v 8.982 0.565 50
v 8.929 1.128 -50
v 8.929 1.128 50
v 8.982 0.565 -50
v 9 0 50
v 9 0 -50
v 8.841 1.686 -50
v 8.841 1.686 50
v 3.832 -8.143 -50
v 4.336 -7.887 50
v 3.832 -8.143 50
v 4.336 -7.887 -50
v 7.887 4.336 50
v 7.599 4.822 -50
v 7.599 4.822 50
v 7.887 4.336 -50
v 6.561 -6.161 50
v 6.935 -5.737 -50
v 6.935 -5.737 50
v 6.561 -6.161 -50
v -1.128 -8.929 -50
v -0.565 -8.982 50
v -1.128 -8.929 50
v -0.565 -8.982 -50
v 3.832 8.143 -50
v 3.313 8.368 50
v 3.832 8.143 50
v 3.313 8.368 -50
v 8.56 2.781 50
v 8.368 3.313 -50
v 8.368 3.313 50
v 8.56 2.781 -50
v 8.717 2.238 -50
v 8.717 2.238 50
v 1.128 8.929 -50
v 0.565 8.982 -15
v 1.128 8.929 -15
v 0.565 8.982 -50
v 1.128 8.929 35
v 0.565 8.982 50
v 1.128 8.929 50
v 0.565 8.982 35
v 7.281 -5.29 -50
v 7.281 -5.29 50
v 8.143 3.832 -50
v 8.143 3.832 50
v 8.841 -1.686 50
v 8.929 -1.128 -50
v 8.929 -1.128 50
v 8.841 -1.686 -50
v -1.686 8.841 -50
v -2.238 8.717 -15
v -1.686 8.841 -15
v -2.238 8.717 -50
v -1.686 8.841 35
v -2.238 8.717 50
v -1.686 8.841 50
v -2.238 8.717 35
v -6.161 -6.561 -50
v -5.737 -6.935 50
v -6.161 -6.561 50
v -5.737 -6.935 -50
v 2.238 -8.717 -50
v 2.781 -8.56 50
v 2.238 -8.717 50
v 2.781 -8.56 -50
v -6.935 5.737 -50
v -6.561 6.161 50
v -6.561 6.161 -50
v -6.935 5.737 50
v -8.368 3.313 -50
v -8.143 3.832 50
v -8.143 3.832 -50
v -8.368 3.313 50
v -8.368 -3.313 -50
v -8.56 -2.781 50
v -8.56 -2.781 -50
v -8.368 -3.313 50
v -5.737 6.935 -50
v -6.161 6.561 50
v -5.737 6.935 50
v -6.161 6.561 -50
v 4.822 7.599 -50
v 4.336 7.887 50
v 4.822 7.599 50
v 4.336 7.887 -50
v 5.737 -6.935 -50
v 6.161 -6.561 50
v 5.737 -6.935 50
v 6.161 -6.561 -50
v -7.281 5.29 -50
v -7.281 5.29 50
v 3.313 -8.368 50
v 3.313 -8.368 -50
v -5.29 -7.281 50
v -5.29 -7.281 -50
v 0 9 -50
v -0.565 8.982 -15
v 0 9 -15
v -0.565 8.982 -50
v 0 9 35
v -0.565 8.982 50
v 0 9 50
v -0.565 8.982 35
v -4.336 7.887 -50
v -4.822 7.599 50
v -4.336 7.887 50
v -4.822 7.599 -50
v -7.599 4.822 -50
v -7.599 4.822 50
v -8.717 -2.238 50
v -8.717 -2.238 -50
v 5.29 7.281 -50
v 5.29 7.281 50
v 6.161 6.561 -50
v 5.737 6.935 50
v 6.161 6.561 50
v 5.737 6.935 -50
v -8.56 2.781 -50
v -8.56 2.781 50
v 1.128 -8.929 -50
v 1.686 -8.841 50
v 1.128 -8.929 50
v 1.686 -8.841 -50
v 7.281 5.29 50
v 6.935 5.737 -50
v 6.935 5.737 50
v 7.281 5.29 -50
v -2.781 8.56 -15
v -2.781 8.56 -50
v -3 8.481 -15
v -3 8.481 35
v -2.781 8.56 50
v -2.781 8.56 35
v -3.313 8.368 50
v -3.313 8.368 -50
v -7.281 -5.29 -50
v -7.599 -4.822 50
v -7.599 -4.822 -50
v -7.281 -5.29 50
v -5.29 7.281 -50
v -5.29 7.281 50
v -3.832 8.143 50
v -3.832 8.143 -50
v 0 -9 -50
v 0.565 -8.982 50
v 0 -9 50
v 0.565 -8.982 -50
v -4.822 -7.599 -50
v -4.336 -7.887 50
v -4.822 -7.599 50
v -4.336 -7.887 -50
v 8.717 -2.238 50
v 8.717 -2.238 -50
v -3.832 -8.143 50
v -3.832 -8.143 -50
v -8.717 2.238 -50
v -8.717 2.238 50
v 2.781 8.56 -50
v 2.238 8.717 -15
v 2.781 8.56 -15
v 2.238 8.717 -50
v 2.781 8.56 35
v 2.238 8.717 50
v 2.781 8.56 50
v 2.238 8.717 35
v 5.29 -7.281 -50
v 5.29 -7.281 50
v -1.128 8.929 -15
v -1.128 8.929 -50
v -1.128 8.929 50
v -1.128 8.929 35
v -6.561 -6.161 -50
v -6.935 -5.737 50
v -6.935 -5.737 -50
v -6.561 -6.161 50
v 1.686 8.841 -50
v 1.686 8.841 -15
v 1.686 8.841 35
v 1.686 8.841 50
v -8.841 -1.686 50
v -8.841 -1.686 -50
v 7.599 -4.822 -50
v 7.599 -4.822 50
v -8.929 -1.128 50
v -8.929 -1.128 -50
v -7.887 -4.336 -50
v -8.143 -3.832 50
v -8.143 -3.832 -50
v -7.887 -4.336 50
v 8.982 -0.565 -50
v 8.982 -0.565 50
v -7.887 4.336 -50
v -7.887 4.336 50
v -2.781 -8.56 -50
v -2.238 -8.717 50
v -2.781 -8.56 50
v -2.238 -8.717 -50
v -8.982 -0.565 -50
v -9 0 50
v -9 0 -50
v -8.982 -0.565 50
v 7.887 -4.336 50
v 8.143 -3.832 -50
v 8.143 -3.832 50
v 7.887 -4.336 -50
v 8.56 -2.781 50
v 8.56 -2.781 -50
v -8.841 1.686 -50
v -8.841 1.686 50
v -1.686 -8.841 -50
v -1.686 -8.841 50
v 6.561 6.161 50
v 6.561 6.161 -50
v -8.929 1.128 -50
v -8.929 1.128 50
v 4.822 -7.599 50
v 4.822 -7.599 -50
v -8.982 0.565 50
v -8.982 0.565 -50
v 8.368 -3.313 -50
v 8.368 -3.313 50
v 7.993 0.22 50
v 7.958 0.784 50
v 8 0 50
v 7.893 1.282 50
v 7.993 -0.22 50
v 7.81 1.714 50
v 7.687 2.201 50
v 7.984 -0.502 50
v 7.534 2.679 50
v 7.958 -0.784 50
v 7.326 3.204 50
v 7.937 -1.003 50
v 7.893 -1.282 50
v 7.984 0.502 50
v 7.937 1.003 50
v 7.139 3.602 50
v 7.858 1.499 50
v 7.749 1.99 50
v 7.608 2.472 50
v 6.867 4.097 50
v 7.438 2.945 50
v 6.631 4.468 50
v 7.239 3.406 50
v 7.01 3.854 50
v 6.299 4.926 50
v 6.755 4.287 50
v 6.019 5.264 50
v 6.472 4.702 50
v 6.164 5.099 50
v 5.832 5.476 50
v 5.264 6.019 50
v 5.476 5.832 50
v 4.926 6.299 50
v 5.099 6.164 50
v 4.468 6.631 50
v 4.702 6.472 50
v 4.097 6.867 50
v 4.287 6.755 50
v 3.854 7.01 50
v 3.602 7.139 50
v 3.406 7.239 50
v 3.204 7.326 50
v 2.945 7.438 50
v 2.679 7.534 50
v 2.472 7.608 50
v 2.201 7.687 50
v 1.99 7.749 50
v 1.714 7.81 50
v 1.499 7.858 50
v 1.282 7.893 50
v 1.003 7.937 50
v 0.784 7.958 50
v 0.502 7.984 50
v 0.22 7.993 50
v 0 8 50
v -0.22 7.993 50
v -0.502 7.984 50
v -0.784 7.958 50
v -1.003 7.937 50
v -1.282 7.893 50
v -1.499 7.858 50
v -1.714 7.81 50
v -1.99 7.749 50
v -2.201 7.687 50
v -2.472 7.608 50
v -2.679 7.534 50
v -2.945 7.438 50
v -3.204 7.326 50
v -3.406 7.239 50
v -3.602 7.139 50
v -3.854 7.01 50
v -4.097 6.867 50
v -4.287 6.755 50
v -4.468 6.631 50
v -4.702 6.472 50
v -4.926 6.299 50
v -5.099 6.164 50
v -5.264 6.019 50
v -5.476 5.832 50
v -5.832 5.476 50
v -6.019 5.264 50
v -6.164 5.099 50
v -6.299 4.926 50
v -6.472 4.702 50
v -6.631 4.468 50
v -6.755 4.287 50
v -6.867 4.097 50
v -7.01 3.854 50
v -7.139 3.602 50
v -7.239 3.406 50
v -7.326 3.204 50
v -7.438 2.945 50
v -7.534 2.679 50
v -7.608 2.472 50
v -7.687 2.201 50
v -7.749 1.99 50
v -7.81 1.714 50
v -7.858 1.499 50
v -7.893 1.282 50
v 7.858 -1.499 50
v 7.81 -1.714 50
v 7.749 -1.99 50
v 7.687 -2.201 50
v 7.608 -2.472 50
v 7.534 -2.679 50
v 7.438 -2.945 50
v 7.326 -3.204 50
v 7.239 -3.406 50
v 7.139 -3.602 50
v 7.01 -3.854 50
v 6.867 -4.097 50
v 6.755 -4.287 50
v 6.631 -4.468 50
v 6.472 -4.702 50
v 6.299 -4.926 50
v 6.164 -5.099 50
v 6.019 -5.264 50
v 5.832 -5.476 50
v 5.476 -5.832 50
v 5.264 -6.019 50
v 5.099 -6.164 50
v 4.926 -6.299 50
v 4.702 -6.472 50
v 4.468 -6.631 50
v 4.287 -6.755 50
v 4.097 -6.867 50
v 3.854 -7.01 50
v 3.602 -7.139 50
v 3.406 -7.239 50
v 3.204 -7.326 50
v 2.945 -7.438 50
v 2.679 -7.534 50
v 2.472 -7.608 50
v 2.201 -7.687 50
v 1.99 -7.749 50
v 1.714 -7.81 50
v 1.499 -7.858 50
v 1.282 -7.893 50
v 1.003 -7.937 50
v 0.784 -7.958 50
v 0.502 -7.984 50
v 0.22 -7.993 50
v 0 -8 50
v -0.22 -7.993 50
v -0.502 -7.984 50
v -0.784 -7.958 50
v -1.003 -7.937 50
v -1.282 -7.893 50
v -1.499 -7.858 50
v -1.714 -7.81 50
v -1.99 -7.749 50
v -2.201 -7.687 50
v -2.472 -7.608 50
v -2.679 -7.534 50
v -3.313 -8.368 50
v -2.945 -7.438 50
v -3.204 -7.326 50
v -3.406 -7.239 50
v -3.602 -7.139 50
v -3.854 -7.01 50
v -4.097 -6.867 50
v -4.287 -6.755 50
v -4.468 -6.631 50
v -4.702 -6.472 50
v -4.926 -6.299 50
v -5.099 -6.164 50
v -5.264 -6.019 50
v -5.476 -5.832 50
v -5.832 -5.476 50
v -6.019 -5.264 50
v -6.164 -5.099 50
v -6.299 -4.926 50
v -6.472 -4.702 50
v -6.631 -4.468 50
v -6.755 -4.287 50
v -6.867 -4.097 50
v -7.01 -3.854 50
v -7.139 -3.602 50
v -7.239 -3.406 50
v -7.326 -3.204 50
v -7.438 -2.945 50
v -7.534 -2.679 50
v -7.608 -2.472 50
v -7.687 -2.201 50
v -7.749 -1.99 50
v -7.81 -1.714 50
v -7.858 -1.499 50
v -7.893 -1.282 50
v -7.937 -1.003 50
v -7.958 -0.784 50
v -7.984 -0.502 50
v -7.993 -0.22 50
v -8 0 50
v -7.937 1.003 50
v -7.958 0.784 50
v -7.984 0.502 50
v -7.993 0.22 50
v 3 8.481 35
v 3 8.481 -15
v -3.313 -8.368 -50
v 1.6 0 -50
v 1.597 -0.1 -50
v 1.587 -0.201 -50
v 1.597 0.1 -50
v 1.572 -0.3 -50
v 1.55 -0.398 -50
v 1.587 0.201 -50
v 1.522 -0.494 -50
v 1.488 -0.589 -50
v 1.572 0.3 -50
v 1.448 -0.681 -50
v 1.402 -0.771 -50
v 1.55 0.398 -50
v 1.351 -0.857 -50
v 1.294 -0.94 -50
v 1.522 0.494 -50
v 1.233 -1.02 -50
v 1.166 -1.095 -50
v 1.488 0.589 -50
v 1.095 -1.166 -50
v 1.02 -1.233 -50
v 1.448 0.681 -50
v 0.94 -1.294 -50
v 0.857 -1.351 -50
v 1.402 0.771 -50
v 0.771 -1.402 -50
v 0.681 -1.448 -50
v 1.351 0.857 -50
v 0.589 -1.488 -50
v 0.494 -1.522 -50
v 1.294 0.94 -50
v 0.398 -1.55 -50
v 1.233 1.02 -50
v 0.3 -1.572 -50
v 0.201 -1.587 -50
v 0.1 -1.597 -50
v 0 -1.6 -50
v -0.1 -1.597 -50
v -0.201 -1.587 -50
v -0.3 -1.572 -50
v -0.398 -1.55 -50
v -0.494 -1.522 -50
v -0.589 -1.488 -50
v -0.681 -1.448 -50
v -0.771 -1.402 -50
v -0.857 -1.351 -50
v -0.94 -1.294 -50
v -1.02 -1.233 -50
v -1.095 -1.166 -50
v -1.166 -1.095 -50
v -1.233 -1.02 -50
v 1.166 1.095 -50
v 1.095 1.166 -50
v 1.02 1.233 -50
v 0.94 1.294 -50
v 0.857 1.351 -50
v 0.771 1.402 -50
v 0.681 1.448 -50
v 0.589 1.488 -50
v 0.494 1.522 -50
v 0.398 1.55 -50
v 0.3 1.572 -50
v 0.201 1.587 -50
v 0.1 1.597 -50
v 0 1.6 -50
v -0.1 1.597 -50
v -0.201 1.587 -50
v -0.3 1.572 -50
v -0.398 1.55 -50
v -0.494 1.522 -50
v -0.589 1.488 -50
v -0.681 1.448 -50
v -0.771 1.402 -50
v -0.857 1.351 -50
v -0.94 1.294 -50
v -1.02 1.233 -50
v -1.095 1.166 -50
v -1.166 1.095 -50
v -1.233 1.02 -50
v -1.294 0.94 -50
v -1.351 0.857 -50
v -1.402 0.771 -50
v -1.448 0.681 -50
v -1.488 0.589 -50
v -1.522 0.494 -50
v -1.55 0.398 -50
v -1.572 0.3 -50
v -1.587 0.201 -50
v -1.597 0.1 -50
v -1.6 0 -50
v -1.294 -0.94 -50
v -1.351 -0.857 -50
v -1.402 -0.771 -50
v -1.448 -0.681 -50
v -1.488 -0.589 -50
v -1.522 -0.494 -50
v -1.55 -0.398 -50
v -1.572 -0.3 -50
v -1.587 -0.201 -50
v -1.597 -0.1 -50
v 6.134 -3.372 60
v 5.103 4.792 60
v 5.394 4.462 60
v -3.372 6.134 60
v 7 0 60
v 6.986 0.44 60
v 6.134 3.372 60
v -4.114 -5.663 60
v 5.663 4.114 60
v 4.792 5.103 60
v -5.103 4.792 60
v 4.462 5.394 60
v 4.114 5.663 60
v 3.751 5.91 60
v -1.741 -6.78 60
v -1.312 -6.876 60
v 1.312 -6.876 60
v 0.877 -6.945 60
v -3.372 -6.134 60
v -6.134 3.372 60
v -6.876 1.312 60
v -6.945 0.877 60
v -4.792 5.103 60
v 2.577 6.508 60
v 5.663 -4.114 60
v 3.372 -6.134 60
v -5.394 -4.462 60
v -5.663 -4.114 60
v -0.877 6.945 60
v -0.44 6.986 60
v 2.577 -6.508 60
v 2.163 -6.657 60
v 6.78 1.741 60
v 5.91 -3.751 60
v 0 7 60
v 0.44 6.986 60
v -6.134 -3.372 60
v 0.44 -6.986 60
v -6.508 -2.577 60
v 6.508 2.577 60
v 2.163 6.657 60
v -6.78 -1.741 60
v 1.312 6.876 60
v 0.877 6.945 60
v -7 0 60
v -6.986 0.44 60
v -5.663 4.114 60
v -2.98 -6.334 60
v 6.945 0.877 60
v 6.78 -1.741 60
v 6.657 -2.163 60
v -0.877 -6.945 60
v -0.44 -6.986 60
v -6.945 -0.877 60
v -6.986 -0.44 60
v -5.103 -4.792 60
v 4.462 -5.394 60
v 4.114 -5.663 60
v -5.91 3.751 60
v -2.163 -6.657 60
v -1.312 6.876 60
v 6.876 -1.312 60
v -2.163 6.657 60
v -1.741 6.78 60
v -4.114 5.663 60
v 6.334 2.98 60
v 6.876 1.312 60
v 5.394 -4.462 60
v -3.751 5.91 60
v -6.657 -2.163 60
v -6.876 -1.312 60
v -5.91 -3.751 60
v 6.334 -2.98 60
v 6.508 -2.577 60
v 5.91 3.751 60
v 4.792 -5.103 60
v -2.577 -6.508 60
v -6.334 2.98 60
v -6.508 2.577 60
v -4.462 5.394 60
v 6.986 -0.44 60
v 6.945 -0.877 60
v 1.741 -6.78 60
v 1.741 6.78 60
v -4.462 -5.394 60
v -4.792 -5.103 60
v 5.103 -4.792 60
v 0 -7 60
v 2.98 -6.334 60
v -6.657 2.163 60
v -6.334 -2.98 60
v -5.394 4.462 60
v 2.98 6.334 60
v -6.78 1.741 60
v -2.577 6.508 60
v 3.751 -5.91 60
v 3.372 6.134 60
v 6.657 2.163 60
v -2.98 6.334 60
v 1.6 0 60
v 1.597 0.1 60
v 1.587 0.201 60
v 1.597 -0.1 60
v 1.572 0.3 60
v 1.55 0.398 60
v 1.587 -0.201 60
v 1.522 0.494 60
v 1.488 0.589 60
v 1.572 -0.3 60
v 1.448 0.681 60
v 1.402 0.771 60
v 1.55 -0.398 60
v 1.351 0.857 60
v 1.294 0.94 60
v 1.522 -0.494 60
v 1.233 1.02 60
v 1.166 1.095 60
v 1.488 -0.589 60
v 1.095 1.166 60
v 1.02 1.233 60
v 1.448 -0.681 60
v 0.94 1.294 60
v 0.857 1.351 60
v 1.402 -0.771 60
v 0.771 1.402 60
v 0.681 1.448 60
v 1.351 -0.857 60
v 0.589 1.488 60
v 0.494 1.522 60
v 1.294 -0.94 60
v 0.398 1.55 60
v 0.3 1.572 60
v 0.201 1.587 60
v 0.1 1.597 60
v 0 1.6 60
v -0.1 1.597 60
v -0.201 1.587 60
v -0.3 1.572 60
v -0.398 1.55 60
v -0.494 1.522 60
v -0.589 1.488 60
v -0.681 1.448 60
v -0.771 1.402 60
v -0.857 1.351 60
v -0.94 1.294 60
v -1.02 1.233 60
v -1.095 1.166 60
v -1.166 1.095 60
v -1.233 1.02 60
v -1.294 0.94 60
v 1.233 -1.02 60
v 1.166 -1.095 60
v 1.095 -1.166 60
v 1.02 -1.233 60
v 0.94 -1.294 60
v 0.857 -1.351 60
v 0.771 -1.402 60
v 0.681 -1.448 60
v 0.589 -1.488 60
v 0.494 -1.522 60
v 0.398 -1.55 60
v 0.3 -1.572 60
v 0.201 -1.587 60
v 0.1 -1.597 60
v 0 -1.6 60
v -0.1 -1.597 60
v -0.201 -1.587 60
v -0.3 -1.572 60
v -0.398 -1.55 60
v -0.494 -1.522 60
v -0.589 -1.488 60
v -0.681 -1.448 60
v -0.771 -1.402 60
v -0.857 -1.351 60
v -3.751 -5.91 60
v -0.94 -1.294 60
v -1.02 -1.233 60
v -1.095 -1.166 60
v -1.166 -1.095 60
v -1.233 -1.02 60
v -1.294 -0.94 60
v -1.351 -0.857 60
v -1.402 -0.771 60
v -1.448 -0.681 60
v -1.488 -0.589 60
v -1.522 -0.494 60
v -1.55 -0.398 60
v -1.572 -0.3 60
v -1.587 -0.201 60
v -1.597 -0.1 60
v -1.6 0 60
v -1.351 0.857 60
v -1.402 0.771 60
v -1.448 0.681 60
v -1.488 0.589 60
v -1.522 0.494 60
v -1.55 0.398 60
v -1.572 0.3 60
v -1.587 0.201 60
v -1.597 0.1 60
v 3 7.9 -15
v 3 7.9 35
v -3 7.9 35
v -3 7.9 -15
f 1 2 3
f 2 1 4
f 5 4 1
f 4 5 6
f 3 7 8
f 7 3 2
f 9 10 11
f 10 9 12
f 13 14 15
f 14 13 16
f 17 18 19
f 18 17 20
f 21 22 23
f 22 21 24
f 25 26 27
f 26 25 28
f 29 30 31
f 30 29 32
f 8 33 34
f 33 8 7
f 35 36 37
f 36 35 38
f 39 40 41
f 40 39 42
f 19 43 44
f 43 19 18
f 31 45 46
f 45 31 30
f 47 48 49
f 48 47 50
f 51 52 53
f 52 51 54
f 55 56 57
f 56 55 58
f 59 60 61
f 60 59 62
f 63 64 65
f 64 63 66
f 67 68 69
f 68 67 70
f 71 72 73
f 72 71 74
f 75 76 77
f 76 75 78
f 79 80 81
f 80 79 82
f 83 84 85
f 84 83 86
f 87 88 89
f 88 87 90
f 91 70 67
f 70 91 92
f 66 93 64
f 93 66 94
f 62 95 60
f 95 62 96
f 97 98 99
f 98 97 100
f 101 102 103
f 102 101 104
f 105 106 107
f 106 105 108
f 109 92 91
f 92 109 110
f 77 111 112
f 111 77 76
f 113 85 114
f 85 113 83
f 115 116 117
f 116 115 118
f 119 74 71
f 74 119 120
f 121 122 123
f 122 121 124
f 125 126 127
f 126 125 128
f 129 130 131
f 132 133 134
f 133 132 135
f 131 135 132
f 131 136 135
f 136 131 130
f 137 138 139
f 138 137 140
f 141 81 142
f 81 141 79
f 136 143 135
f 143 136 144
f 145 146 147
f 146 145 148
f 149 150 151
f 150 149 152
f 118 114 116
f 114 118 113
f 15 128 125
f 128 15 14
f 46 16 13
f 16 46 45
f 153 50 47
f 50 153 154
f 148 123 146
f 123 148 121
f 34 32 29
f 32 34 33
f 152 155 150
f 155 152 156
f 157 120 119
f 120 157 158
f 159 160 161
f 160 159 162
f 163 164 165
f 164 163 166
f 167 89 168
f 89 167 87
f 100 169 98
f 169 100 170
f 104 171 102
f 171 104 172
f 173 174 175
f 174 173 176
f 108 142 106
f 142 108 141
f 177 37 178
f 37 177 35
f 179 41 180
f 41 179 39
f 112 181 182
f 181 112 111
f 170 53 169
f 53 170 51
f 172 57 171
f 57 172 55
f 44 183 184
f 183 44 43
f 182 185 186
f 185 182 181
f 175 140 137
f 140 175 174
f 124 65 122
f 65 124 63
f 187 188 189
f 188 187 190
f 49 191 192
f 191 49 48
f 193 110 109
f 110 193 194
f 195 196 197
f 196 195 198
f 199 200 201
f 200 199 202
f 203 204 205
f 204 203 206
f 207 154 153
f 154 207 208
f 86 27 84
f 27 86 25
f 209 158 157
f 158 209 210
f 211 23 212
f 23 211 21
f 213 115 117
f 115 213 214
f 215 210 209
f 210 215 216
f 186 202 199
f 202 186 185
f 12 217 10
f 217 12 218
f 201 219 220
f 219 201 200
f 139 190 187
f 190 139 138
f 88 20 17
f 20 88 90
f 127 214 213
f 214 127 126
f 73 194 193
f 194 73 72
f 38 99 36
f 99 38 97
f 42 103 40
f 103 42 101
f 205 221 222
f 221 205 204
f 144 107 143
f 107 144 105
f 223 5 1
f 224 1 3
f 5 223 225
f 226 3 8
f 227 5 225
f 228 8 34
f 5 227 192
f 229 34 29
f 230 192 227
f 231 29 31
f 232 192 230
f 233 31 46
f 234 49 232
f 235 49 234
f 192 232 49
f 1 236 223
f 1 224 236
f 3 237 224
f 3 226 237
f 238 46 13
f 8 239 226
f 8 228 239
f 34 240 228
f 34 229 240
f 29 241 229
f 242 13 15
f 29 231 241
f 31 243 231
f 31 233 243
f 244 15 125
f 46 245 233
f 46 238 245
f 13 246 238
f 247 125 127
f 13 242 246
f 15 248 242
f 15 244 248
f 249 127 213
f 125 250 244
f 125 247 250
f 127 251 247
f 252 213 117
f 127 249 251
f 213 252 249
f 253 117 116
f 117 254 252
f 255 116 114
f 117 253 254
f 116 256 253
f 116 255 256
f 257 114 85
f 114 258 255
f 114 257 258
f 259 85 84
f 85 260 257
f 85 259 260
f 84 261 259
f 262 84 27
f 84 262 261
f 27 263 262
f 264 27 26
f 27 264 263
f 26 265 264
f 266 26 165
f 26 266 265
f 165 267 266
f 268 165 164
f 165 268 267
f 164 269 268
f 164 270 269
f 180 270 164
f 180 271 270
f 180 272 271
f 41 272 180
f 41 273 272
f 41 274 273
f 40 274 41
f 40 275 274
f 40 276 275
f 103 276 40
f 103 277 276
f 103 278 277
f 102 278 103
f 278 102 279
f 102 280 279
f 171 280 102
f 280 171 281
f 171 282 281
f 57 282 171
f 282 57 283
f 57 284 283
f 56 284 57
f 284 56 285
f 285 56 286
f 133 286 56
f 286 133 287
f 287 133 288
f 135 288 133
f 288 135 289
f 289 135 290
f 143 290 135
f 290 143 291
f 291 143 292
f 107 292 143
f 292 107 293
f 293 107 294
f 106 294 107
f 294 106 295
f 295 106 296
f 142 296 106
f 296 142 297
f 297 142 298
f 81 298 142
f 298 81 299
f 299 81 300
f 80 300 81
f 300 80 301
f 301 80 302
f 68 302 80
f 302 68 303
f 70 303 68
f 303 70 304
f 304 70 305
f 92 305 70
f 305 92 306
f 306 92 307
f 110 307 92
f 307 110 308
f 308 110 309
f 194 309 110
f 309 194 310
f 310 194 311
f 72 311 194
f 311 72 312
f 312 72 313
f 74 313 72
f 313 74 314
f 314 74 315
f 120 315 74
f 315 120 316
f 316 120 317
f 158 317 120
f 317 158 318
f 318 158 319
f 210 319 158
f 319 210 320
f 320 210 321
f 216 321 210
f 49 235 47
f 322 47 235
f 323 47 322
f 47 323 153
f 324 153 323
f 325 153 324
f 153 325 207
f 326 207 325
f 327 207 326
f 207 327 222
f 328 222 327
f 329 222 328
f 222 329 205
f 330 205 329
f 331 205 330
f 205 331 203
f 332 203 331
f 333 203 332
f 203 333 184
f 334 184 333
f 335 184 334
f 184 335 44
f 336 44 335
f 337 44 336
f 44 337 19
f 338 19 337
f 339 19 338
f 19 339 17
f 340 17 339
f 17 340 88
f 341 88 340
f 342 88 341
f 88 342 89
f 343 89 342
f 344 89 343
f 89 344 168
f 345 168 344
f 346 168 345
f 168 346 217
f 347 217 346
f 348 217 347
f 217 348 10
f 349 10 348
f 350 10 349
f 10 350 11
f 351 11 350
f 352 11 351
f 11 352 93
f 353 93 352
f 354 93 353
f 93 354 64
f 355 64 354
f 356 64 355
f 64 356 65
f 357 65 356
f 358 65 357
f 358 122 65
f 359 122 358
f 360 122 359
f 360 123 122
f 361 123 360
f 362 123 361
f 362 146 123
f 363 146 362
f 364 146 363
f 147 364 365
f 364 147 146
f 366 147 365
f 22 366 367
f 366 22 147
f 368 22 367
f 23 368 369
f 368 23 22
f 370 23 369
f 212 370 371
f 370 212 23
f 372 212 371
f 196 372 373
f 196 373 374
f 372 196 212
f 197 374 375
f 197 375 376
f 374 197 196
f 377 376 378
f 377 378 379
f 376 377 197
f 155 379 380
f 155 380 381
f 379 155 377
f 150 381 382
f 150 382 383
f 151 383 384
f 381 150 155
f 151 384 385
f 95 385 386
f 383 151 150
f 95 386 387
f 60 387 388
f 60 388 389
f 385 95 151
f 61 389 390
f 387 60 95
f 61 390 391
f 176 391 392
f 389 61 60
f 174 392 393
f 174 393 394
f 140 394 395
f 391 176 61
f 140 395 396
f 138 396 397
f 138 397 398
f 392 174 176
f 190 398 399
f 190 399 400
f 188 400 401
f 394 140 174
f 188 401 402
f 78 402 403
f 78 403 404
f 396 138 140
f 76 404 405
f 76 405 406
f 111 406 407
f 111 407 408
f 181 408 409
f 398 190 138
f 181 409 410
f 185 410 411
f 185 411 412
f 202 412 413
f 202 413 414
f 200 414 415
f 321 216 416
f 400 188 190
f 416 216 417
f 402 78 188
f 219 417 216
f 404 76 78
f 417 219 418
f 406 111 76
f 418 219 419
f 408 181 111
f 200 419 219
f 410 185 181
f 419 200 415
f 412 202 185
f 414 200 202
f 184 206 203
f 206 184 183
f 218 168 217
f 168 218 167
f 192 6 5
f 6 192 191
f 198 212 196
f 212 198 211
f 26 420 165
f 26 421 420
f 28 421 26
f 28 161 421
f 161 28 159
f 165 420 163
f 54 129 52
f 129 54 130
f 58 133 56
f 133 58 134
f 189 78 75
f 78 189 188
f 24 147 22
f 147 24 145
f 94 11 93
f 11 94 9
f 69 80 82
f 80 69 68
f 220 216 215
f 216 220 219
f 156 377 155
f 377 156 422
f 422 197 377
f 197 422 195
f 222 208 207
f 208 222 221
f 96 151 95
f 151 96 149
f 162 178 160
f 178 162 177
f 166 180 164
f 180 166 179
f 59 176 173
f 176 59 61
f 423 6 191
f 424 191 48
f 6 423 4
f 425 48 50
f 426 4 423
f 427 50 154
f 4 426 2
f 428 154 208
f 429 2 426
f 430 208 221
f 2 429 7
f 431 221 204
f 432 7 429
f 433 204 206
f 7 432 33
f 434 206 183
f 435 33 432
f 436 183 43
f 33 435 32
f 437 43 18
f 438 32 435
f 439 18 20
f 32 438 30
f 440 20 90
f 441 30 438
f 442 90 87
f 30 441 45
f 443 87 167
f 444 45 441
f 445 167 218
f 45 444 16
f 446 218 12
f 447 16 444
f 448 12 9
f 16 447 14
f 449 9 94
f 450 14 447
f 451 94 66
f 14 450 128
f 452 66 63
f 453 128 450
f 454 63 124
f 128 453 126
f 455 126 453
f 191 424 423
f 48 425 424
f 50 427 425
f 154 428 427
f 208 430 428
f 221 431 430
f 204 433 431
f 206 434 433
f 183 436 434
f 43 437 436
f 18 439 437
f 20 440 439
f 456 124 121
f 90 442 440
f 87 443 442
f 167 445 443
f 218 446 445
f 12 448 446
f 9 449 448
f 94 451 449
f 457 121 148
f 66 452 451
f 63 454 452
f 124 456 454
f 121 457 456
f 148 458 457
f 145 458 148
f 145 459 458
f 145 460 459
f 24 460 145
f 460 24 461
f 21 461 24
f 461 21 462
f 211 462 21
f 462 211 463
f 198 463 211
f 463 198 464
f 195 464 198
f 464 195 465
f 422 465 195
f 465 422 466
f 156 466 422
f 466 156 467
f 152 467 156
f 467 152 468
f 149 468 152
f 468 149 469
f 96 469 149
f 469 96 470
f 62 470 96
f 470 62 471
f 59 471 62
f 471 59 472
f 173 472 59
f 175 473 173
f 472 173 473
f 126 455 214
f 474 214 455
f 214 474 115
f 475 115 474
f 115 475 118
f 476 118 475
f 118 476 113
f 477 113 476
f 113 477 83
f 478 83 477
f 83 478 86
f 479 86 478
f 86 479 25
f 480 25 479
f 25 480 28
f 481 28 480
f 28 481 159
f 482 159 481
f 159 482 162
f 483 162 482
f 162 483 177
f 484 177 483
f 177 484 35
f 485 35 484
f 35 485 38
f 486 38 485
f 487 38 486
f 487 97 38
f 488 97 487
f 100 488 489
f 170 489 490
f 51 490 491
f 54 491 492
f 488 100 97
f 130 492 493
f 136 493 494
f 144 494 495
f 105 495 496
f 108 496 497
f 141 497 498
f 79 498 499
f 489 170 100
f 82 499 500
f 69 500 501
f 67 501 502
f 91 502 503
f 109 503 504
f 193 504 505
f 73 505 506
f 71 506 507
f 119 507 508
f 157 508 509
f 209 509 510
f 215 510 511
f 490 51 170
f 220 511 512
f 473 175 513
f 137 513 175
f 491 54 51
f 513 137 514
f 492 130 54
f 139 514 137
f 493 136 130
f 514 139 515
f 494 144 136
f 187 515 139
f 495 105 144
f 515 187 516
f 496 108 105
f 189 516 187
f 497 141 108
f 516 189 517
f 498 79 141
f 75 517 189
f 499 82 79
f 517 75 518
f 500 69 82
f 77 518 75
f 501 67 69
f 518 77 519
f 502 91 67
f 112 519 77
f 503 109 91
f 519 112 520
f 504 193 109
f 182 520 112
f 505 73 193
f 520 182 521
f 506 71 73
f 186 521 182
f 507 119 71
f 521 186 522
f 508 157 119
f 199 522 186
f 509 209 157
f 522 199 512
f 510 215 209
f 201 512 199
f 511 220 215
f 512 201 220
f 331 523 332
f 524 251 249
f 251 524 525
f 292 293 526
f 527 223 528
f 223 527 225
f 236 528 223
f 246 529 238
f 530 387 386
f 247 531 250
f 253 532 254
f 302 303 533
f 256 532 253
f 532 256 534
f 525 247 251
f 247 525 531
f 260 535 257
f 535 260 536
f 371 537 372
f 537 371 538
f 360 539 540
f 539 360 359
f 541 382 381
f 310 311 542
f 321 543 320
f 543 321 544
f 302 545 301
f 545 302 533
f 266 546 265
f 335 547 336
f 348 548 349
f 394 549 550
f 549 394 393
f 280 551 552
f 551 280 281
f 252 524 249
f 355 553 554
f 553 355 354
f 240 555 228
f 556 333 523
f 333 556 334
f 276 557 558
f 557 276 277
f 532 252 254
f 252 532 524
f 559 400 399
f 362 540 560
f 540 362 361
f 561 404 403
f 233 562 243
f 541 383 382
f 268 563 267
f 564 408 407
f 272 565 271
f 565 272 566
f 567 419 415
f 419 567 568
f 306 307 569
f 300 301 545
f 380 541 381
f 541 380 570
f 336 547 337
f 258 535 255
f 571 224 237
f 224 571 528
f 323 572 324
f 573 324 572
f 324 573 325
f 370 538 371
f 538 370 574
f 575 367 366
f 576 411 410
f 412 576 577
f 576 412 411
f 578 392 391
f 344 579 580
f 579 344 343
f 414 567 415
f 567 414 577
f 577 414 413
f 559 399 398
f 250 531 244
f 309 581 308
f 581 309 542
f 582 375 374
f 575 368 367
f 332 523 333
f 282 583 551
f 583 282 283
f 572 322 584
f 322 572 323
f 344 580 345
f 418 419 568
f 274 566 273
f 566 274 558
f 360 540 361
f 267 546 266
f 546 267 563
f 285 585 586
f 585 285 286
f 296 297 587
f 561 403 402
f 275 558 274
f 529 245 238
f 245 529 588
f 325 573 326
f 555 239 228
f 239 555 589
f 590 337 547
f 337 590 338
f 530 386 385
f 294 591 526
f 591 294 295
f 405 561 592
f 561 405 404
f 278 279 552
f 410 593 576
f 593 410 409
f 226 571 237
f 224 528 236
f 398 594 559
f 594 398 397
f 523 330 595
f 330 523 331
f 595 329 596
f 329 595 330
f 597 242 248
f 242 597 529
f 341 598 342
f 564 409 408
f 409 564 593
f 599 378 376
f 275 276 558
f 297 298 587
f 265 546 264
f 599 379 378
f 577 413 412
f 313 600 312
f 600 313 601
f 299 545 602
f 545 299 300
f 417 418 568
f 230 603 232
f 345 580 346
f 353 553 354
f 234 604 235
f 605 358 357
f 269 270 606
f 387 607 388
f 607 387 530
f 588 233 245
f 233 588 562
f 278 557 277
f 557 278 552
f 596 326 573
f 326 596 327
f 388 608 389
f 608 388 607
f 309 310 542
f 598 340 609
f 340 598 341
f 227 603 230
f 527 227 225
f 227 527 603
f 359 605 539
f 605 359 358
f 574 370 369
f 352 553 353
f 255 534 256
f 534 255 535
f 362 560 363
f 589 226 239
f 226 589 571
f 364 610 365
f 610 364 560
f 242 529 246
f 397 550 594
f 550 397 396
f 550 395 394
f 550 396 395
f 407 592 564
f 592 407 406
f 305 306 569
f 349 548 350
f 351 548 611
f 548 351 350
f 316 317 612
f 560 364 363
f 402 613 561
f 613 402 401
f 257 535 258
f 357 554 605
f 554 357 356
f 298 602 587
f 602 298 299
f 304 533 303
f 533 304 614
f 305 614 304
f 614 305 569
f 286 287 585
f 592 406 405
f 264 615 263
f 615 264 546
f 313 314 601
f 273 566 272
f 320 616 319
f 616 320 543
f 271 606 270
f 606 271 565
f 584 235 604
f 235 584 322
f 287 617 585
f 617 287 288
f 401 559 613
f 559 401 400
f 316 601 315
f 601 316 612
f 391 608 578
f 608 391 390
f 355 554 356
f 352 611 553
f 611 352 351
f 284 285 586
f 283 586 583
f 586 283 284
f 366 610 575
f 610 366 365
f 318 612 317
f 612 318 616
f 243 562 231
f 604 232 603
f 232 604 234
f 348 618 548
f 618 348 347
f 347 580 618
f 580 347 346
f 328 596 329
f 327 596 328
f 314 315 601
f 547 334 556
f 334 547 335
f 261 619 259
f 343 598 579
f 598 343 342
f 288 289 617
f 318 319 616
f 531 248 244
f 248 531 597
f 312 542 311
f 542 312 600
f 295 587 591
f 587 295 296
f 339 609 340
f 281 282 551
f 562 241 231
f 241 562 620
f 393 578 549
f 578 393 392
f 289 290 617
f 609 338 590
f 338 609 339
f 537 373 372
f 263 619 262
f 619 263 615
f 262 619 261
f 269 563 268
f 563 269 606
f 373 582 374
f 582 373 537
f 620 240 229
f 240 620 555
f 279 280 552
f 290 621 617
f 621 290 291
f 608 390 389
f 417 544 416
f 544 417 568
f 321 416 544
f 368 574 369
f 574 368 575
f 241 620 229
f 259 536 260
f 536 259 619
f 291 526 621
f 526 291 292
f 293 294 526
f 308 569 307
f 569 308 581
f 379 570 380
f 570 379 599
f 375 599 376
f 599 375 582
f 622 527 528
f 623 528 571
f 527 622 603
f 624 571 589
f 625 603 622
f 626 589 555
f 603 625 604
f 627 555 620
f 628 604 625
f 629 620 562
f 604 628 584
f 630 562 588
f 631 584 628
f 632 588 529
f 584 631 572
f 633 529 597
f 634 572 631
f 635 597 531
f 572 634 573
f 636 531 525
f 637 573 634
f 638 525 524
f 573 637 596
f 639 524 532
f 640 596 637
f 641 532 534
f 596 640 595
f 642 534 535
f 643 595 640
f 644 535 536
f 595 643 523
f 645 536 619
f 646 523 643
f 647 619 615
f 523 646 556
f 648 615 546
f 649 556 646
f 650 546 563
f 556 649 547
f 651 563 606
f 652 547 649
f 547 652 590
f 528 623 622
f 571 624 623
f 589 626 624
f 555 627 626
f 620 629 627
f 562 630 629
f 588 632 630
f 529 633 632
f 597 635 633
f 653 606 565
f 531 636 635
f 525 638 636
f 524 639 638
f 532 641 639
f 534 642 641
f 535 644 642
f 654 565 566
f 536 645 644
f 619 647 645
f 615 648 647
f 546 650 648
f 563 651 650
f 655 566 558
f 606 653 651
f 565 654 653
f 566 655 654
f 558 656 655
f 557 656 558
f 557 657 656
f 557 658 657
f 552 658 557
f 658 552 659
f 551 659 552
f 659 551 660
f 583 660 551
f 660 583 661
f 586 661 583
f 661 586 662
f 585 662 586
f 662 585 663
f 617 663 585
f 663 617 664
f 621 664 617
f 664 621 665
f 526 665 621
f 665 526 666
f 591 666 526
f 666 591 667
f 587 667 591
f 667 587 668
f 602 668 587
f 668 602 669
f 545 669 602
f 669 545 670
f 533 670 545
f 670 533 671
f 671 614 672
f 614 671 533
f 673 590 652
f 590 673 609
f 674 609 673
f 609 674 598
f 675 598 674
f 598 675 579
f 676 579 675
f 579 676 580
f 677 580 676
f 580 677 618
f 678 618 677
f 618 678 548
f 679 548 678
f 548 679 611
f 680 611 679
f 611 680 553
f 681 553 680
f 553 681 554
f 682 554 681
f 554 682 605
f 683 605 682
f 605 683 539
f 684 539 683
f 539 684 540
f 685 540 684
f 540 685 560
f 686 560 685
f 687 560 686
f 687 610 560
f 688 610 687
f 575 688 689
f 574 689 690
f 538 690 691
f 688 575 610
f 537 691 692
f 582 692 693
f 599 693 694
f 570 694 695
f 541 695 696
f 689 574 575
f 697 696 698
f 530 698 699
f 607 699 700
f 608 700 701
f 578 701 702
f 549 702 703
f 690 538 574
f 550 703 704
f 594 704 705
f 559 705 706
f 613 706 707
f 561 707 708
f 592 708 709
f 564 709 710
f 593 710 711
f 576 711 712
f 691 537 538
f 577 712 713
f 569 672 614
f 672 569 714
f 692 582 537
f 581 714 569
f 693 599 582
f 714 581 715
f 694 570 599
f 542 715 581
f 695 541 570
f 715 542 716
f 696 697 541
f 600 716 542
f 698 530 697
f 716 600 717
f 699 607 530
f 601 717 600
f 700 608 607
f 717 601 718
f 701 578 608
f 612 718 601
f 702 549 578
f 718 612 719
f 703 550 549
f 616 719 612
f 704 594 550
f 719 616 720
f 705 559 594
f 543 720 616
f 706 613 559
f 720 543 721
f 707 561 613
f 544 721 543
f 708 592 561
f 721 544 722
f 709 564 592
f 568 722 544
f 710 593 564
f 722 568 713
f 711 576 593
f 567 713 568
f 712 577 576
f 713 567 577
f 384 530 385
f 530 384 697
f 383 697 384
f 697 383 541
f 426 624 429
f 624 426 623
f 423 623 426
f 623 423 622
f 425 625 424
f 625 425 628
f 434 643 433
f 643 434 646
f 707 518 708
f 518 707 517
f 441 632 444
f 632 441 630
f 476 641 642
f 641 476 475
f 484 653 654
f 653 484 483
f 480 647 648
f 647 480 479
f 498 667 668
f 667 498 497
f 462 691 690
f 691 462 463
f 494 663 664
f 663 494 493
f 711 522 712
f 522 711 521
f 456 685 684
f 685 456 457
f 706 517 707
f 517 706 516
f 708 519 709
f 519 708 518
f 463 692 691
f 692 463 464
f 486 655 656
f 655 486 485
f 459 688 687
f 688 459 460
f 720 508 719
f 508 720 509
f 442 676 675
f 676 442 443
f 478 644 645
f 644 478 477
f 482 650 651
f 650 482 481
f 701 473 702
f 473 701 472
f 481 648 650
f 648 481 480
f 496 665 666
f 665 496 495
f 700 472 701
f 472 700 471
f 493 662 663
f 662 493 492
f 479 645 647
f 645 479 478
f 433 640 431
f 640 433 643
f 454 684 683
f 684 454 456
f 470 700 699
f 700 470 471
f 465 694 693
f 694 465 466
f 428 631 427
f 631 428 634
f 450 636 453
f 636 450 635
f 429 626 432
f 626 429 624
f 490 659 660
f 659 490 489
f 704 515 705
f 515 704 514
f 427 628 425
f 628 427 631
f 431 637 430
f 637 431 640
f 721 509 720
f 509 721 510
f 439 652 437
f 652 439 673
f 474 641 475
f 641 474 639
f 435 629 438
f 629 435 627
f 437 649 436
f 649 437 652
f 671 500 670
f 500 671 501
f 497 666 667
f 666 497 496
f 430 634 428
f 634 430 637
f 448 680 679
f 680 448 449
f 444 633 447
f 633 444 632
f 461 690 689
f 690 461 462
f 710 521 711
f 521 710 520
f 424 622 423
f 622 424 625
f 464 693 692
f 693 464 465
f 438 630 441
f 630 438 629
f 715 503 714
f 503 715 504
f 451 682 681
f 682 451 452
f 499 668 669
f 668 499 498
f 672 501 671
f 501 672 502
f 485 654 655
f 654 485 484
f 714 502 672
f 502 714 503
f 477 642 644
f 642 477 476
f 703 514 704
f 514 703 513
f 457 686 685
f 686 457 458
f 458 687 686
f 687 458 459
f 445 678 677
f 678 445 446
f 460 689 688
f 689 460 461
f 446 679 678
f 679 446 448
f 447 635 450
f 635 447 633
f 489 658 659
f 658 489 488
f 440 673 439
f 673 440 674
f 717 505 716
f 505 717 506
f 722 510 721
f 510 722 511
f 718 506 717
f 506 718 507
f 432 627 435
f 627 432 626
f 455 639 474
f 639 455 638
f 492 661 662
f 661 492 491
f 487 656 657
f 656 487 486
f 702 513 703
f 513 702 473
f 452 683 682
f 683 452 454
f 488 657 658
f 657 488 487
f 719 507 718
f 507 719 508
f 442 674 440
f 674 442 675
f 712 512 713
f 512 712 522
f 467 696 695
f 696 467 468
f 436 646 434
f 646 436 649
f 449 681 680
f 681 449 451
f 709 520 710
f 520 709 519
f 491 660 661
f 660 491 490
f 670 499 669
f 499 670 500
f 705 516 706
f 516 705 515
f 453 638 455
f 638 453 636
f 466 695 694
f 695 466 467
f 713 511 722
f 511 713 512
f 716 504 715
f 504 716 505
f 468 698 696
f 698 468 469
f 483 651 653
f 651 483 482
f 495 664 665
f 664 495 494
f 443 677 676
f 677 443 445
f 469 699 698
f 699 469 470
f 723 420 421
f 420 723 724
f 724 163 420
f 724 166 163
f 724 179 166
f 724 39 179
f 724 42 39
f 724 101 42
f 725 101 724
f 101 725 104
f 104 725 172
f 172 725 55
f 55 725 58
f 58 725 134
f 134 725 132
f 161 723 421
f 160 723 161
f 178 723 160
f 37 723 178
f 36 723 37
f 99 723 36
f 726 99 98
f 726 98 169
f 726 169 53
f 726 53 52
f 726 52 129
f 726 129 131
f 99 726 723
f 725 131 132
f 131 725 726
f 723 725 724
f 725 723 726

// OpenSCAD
// Project Delta Pen (DP-1) - Ergonomic Handheld Chassis
// Tolerances and variables optimized for FSR strip insertion and NEMA 8 motor alignment.

$fn = 100;

// Pen dimensions
pen_length = 120;
pen_diameter = 18;
grip_taper = 14;

// Motor mounting base
motor_width = 20.5; // NEMA 8
motor_hole_spacing = 16.0;

module main_chassis() {
    difference() {
        // Main cylindrical handle
        union() {
            cylinder(h=pen_length - 20, d=pen_diameter, center=true);
            translate([0, 0, (pen_length/2) - 10])
                cylinder(h=20, d1=pen_diameter, d2=grip_taper, center=true);
        }
        
        // Coaxial wire feed guide channel (3mm PTFE path)
        cylinder(h=pen_length + 2, d=3.2, center=true);
        
        // FSR Sensor Recess (1mm deep indentation for flush fit)
        translate([0, (pen_diameter/2) - 0.5, 10])
            cube([6, 1.2, 50], center=true);
    }
}

main_chassis();
